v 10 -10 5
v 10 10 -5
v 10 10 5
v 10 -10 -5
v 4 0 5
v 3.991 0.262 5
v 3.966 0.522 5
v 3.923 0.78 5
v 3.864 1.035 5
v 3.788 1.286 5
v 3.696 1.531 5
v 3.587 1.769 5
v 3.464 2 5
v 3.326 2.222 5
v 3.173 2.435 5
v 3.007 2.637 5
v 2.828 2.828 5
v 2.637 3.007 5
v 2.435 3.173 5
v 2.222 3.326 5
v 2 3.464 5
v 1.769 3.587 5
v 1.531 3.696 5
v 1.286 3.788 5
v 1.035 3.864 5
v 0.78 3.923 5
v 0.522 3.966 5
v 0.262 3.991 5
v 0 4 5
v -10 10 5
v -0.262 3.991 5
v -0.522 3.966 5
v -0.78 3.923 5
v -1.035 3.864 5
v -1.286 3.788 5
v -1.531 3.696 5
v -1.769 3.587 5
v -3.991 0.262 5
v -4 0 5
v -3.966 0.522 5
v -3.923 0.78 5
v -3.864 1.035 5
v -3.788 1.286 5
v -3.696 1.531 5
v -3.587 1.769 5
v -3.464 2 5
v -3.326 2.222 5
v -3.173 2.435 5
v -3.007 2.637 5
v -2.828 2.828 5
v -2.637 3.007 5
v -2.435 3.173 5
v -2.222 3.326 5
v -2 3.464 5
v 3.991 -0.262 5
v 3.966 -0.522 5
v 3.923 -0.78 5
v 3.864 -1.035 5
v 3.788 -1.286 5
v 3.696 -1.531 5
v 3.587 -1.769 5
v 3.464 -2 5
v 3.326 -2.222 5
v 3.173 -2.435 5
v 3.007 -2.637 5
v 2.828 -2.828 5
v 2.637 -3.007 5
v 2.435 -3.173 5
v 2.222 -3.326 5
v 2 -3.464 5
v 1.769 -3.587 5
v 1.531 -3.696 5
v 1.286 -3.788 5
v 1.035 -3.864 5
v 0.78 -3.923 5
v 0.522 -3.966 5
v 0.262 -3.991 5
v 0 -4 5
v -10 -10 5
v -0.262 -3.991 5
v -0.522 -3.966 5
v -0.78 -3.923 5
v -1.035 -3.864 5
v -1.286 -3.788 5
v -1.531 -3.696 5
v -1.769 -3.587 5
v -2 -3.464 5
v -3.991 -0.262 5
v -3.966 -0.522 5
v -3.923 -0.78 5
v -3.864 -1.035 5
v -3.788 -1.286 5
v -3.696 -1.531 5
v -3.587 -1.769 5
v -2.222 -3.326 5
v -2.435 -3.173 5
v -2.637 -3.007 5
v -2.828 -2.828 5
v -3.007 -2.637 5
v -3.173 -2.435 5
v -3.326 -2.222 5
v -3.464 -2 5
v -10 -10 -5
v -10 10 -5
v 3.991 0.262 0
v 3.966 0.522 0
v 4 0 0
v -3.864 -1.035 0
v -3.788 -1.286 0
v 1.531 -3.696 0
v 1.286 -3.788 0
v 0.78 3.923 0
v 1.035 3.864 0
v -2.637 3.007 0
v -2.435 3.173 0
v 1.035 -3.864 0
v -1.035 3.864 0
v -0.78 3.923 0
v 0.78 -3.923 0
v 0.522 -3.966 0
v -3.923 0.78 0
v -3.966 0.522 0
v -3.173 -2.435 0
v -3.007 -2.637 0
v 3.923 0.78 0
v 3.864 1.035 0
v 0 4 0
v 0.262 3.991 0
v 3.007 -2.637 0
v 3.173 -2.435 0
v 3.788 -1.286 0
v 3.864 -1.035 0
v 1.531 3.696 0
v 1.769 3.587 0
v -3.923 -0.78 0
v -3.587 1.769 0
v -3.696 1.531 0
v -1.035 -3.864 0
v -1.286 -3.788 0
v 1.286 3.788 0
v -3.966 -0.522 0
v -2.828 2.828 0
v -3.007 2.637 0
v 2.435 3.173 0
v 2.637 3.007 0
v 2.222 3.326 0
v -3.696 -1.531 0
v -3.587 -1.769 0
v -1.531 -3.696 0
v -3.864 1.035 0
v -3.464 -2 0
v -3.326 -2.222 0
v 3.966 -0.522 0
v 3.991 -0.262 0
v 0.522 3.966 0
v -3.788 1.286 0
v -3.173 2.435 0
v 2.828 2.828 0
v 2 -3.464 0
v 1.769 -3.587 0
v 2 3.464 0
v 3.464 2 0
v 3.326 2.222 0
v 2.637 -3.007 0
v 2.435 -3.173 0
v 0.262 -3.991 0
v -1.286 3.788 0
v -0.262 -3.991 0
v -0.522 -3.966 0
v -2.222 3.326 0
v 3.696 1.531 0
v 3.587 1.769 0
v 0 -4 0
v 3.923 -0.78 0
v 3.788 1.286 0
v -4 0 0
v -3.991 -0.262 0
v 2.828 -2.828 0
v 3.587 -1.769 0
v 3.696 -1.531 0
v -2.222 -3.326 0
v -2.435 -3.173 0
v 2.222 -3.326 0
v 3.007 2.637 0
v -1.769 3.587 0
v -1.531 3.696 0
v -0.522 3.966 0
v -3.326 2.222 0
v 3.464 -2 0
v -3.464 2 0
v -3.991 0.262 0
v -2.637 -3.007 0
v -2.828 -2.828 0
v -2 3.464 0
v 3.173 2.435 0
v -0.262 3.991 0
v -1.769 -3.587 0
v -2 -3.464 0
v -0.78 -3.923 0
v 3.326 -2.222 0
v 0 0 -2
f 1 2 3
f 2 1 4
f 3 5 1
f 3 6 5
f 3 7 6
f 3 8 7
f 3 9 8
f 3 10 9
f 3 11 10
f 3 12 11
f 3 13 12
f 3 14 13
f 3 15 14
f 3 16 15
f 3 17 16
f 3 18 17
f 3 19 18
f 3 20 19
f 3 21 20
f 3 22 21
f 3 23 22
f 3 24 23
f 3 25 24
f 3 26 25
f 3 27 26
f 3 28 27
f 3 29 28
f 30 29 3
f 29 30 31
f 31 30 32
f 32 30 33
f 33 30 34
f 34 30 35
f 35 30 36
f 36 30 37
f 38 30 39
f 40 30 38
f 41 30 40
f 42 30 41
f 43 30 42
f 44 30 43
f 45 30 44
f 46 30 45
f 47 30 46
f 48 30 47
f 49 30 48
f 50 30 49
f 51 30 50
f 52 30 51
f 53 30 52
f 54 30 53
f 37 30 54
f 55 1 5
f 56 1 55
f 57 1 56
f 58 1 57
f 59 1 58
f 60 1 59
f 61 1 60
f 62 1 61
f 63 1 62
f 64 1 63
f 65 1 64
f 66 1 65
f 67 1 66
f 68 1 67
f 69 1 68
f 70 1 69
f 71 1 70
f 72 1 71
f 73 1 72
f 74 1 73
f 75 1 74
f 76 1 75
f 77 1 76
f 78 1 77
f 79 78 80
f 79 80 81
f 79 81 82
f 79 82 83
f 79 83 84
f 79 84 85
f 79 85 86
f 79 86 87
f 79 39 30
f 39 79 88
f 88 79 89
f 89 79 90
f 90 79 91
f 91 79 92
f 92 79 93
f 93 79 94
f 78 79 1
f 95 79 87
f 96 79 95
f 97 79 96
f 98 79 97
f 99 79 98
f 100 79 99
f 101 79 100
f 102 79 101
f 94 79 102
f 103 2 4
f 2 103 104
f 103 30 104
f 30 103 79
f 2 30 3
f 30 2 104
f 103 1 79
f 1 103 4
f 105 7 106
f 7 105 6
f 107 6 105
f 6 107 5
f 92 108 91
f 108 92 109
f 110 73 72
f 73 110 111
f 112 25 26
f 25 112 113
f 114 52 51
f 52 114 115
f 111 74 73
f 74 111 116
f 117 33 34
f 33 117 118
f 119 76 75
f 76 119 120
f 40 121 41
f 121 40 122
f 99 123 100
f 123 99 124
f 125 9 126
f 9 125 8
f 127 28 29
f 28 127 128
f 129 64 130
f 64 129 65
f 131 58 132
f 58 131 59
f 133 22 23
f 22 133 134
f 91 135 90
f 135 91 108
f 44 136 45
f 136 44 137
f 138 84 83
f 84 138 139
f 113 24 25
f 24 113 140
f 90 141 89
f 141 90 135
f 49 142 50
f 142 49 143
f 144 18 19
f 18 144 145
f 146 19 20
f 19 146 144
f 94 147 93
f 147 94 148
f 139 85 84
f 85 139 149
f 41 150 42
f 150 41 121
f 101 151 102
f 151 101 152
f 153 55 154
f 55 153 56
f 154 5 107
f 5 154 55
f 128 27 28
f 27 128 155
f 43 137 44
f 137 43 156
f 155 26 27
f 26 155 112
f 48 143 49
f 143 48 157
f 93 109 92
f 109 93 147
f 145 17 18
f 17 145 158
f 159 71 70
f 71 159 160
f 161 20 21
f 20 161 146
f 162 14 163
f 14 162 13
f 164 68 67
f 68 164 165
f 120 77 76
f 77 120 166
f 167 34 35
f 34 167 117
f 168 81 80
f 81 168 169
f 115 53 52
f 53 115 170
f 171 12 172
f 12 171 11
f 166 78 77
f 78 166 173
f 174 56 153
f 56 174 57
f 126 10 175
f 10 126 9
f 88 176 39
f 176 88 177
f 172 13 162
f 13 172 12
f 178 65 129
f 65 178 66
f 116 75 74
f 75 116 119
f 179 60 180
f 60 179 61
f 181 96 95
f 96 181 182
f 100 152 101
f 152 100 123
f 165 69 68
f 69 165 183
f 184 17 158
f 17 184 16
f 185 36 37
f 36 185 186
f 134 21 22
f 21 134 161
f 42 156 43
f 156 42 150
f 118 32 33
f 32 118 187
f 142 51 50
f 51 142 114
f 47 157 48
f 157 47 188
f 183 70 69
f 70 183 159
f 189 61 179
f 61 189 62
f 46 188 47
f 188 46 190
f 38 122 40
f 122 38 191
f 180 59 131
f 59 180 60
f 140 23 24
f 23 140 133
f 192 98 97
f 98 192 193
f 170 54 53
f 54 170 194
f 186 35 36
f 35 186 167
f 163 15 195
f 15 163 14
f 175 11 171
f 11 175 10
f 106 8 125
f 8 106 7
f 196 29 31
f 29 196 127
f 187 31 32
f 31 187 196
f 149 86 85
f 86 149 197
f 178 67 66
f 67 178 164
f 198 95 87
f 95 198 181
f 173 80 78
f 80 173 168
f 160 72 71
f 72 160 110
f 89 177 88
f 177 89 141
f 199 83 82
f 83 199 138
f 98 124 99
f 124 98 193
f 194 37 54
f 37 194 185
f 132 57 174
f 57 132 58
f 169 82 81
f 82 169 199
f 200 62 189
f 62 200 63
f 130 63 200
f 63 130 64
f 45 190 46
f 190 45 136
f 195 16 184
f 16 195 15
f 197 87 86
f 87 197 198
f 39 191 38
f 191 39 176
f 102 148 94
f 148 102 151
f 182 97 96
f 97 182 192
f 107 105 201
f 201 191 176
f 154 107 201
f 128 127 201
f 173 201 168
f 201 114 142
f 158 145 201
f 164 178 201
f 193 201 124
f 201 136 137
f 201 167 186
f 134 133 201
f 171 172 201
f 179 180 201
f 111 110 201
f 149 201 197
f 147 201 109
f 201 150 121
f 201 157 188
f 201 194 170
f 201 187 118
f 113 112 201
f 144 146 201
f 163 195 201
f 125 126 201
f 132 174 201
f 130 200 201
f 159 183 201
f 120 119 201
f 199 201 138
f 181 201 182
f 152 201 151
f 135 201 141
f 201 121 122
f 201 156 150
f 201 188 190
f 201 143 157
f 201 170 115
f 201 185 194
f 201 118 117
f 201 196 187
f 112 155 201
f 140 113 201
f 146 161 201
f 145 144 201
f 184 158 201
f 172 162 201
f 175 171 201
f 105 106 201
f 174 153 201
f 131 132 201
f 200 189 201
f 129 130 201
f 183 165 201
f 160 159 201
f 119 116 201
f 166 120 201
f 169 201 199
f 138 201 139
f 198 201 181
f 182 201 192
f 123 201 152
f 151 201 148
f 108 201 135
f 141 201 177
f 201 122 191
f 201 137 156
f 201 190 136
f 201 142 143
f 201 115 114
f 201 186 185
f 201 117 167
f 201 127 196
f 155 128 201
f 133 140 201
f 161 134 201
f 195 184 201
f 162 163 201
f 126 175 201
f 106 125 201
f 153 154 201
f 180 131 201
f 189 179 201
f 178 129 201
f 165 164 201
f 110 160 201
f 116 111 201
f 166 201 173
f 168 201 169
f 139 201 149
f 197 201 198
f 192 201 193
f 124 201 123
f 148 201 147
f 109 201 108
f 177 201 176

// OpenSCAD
// 08 锥底盲孔 —— 盲特征的另一半：末端**收到一个点**
//
// 05 的盲孔是平底：切片走到孔底就**没有空隙面**了（是"消失"，不是"半径 0"）。
// 这一件把末端做成钻头式的锥尖，于是切片会**连续收到 0**：
//
//   z ∈ [0, 5]   圆柱段 Ø8      → 内切圆 4.000
//   z ∈ [-2, 0)  锥尖段         → 内切圆从 4.000 线性收到 0
//
// 于是"沿轴多刀取最小"会读到 **0** —— 而这个 0 **不是通道的瓶颈**，
// 是特征自己走到了尽头。拿它当判据，每一个盲特征都会被判成"通道为零"。
//
// 真值：它不是通道（没有第二个开口）。若要谈"开口"，开口是 Ø8（半径 4.000）。
$fn = 96;
difference() {
  cube([20, 20, 10], center = true);
  // cyl 默认不居中（z ∈ [0,h]），一律显式 center=true
  translate([0, 0, 2.5]) cylinder(r = 4, h = 5, center = true);          // 圆柱段 z ∈ [0, 5]
  translate([0, 0, -1]) cylinder(r1 = 0, r2 = 4, h = 2, center = true);  // 锥尖段 z ∈ [-2, 0]，尖在 z=-2
}
